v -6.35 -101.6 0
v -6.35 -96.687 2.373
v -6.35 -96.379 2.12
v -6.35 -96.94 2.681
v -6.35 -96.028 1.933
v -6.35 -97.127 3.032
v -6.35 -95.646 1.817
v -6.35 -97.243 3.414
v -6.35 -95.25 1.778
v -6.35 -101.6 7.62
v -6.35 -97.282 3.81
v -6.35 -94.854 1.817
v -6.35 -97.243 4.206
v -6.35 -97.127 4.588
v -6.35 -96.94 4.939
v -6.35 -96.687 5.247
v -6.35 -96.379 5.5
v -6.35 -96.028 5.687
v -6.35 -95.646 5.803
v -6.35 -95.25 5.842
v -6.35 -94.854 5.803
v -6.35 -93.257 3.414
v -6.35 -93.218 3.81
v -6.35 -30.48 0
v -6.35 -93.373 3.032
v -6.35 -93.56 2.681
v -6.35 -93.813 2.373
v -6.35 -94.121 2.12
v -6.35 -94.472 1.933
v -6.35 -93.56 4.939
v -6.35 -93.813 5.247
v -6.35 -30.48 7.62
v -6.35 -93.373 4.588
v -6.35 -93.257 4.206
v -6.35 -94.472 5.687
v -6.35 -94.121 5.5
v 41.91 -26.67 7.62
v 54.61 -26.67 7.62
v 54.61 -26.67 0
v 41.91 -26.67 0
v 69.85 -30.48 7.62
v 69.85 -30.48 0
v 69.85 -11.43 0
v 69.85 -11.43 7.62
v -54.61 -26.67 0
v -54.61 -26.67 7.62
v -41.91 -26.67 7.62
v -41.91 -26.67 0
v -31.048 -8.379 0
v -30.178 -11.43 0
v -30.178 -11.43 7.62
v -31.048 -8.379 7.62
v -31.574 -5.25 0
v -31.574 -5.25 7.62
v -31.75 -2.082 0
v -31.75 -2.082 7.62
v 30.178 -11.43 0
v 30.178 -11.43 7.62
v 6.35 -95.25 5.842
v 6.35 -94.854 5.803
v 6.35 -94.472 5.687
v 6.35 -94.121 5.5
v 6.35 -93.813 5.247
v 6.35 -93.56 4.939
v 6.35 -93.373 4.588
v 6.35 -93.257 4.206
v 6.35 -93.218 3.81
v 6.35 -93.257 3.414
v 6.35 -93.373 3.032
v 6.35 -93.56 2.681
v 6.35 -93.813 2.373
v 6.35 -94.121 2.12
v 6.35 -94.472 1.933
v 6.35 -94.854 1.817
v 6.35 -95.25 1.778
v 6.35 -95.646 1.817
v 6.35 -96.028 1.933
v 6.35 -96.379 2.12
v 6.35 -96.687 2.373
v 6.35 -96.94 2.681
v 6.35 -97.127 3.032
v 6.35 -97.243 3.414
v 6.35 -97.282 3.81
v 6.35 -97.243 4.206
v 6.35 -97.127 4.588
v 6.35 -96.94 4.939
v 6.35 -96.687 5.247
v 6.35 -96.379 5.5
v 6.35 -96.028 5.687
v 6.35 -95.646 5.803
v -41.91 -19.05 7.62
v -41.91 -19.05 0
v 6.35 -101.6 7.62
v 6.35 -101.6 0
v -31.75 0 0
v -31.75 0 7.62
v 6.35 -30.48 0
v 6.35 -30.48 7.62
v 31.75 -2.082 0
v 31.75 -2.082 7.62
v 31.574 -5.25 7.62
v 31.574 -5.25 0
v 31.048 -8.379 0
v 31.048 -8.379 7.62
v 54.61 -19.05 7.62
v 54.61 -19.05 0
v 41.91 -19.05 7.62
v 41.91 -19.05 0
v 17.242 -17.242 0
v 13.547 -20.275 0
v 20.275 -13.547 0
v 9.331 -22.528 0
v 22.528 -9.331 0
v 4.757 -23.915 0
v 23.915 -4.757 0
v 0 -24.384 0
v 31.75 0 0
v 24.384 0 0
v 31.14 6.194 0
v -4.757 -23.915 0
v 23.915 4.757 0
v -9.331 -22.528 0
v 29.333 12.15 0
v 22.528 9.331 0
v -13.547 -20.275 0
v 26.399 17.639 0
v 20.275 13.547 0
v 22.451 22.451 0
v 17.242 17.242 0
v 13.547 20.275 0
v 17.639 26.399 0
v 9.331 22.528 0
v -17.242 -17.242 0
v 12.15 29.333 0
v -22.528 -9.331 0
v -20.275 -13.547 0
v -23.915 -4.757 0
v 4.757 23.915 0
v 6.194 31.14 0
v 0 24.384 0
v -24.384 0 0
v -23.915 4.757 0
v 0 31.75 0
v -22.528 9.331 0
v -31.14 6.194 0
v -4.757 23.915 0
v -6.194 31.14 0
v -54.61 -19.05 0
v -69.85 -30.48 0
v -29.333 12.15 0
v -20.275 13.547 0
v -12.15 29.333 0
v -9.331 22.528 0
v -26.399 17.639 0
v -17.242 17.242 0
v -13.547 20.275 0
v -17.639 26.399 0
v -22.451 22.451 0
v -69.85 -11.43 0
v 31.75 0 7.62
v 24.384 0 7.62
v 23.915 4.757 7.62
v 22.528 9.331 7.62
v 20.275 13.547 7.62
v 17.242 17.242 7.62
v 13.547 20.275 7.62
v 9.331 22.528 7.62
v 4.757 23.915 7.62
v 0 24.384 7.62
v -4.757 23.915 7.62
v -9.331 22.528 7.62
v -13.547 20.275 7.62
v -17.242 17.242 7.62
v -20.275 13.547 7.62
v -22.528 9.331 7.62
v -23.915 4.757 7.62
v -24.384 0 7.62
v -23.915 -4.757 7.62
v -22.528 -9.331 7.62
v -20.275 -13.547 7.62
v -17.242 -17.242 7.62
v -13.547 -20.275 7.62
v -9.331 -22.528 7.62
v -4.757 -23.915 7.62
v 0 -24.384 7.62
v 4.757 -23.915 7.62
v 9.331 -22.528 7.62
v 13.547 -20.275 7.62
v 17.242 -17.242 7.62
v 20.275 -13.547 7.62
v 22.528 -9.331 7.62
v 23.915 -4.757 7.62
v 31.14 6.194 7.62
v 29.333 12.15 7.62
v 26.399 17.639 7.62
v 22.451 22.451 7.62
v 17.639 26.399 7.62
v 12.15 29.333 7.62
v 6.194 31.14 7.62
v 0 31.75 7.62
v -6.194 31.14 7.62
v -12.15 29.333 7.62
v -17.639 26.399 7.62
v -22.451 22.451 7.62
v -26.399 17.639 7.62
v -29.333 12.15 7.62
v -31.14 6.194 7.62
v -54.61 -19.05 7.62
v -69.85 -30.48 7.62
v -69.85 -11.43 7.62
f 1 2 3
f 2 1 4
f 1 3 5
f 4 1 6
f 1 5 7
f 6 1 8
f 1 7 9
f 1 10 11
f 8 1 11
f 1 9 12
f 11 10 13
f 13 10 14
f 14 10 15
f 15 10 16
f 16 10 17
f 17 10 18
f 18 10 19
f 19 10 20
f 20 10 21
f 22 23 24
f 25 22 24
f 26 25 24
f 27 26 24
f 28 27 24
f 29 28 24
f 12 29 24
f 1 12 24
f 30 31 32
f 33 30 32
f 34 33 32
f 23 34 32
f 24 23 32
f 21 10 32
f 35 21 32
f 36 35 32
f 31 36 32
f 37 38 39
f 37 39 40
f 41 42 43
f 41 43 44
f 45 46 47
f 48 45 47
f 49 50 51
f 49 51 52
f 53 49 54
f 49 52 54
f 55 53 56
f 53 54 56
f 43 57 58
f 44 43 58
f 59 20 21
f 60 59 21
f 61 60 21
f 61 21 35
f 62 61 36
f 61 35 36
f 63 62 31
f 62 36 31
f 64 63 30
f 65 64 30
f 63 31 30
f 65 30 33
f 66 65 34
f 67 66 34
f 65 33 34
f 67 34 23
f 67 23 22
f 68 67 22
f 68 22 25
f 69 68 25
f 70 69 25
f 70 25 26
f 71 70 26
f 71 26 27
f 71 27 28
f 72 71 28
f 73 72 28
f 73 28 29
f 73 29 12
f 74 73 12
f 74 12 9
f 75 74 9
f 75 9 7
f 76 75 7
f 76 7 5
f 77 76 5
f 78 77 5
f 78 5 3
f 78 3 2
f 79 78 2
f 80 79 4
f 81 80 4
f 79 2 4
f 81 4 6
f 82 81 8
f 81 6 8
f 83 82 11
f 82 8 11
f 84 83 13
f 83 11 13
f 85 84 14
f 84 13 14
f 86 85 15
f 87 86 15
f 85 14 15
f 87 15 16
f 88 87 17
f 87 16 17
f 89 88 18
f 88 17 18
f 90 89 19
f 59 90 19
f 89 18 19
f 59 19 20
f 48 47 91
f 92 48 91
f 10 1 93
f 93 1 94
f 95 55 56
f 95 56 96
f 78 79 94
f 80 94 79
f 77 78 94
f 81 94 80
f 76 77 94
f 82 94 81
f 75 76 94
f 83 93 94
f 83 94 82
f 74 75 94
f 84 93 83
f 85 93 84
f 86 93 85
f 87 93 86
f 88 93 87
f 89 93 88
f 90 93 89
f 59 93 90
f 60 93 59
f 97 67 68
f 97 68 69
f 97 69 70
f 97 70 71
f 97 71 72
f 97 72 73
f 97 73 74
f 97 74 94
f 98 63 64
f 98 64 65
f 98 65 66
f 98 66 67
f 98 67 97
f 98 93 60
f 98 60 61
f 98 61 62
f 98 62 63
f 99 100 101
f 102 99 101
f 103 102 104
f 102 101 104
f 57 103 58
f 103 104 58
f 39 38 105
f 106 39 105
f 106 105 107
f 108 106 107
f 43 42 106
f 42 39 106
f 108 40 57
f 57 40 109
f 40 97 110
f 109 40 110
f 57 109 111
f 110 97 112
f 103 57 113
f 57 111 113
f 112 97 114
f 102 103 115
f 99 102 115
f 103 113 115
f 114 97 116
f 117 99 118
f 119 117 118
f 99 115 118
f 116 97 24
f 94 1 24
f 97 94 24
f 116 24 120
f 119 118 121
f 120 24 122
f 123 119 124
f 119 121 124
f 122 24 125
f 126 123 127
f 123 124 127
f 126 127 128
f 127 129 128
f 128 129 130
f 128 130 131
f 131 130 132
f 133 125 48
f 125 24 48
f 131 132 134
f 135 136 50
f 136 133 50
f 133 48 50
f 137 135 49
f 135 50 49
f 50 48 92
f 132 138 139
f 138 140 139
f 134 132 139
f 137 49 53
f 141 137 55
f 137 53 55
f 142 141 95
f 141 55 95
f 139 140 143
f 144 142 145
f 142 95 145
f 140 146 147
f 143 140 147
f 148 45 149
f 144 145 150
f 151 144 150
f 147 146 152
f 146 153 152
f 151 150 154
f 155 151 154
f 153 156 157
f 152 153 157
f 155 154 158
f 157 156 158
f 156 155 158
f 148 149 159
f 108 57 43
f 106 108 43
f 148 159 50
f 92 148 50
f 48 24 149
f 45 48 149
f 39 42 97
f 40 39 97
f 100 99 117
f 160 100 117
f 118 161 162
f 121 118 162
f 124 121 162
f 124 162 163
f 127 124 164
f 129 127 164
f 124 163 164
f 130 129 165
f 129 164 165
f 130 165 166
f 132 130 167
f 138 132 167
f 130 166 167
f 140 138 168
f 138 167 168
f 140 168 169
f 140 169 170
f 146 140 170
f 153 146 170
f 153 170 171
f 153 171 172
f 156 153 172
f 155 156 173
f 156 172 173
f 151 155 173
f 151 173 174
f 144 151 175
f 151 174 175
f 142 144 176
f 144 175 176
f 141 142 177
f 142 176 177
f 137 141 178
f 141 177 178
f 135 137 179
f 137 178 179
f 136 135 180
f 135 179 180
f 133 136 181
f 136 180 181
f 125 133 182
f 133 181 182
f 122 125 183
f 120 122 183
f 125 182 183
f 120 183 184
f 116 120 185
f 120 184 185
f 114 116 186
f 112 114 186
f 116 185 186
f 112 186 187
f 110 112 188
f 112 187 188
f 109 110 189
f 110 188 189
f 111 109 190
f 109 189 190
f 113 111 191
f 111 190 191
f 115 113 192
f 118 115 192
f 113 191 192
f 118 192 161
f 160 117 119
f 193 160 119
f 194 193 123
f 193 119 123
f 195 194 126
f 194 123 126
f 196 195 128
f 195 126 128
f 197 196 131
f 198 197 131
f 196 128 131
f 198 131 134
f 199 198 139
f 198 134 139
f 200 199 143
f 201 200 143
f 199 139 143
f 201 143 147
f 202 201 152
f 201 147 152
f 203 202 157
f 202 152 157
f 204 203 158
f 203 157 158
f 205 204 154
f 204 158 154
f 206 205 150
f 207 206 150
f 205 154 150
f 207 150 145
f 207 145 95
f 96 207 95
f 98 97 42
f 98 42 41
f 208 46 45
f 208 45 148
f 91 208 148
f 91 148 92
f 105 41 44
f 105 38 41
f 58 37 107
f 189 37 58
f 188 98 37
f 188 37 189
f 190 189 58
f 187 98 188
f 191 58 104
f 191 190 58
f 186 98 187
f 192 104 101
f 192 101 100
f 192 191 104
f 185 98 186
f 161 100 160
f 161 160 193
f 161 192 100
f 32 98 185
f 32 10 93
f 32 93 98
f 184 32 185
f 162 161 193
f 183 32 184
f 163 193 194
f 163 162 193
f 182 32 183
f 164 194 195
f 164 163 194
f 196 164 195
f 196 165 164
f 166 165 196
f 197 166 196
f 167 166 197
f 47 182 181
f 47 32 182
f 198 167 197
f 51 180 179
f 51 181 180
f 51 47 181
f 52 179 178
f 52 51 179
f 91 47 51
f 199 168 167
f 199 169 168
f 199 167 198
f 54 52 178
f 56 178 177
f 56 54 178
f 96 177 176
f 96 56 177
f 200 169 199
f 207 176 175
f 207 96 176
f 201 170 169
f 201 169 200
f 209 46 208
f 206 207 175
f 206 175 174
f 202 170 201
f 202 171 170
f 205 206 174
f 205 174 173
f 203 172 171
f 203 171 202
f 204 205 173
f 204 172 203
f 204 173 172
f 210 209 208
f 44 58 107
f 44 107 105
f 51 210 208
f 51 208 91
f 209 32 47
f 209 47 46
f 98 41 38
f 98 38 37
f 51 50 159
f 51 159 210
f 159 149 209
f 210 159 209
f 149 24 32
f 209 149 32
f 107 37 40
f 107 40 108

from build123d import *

# Parameters (mm, degrees)
SKETCH1_R           = 31.75
BOSS_EXTRUDE1_DEPTH = 7.62
BOSS_EXTRUDE2_START = -7.62
SKETCH2_W           = 63.5
SKETCH2_H           = 101.6
BOSS_EXTRUDE2_DEPTH = 7.62
SKETCH4_W           = 25.4
SKETCH4_H           = 71.12
CUT_EXTRUDE2_DEPTH  = 107.717790925
FILLET1_R           = 28.575
SKETCH6_W           = 7.62
SKETCH6_H           = 19.05
BOSS_EXTRUDE3_DEPTH = 63.5
SKETCH5_R           = 2.032
CUT_EXTRUDE3_DEPTH  = 128.22839463
SKETCH3_R           = 24.384
CUT_EXTRUDE1_DEPTH  = 7.62
SKETCH7_W           = 12.7
SKETCH7_H           = 7.62
CUT_EXTRUDE4_DEPTH  = 124.529943334


with BuildPart() as part:
    # Sketch1 → Boss-Extrude1 (new body)
    with BuildSketch(Plane.XY):
        with Locations(Location((0, 0, 0), (0, 0, 180))):
            Circle(SKETCH1_R)
    extrude(amount=BOSS_EXTRUDE1_DEPTH)

    # Sketch2 → Boss-Extrude2 (add)
    with BuildSketch(Plane.XY.offset(7.62).offset(BOSS_EXTRUDE2_START)):
        with Locations((0, -50.8)):
            Rectangle(SKETCH2_W, SKETCH2_H)
    extrude(amount=BOSS_EXTRUDE2_DEPTH)

    # Sketch4 → Cut-Extrude2 (cut, through all)
    with BuildSketch(Plane.XY.offset(7.62)):
        with Locations((-19.05, -66.04)):
            Rectangle(SKETCH4_W, SKETCH4_H)
        with Locations((19.05, -66.04)):
            Rectangle(SKETCH4_W, SKETCH4_H)
    extrude(amount=-CUT_EXTRUDE2_DEPTH, mode=Mode.SUBTRACT)

    # Fillet1
    # the kernel refuses this fillet: 28.575 mm, written as the material it takes off along each edge
    with BuildSketch(Plane(origin=(31.75, -30.48, 78.615158286), x_dir=(0, 1, 0), z_dir=(0, 0, -1))) as fillet1_piece_1:
        with BuildLine():
            CenterArc((28.398063314, -28.575), FILLET1_R, 90, 83.620629792)
            Line((0, -25.4), (-0.567961266, -25.3365))
            ThreePointArc((-0.567961266, -25.3365), (-0.5715, -12.7), (-0.5715, 0))
            Line((-0.5715, 0), (0, 0.5715))
            Line((0, 0.5715), (28.398063314, 0.5715))
            Line((28.398063314, 0.5715), (28.398063314, 0))
        make_face()
    extrude(amount=149.610316571, mode=Mode.SUBTRACT)
    with BuildSketch(Plane(origin=(-31.75, -30.48, 78.615158286), x_dir=(1, 0, 0), z_dir=(0, 0, -1))) as fillet1_piece_2:
        with BuildLine():
            CenterArc((28.575, -28.398063314), FILLET1_R, 96.379370208, 83.620629792)
            Line((0, -28.398063314), (-0.5715, -28.398063314))
            Line((-0.5715, -28.398063314), (-0.5715, 0))
            Line((-0.5715, 0), (0, 0.5715))
            ThreePointArc((0, 0.5715), (12.7, 0.5715), (25.3365, 0.567961266))
            Line((25.3365, 0.567961266), (25.4, 0))
        make_face()
    extrude(amount=149.610316571, mode=Mode.SUBTRACT)

    # Sketch6 → Boss-Extrude3 (add)
    with BuildSketch(Plane.ZY.offset(6.35)):
        with Locations((3.81, -20.955)):
            Rectangle(SKETCH6_W, SKETCH6_H)
    boss_extrude3 = extrude(amount=BOSS_EXTRUDE3_DEPTH)

    # Mirror1: Boss-Extrude3 across plane
    add(boss_extrude3.mirror(Plane(origin=(0, 0, 0), x_dir=(0, 0, 1), z_dir=(1, 0, 0))))

    # Sketch5 → Cut-Extrude3 (cut, through all)
    with BuildSketch(Plane.ZY.offset(6.35)):
        with Locations((3.81, -95.25)):
            Circle(SKETCH5_R)
    extrude(amount=-CUT_EXTRUDE3_DEPTH, mode=Mode.SUBTRACT)

    # Sketch3 → Cut-Extrude1 (cut)
    with BuildSketch(Plane.XY.offset(7.62)):
        Circle(SKETCH3_R)
    extrude(amount=-CUT_EXTRUDE1_DEPTH, mode=Mode.SUBTRACT)

    # Sketch7 → Cut-Extrude4 (cut, through all)
    with BuildSketch(Plane.XY.offset(7.62)):
        with Locations((-48.26, -22.86)):
            Rectangle(SKETCH7_W, SKETCH7_H)
    cut_extrude4 = extrude(amount=-CUT_EXTRUDE4_DEPTH, mode=Mode.SUBTRACT)

    # Mirror2: Cut-Extrude4 across plane
    add(cut_extrude4.mirror(Plane(origin=(0, 0, 0), x_dir=(0, 0, 1), z_dir=(1, 0, 0))), mode=Mode.SUBTRACT)


solid = part.part
